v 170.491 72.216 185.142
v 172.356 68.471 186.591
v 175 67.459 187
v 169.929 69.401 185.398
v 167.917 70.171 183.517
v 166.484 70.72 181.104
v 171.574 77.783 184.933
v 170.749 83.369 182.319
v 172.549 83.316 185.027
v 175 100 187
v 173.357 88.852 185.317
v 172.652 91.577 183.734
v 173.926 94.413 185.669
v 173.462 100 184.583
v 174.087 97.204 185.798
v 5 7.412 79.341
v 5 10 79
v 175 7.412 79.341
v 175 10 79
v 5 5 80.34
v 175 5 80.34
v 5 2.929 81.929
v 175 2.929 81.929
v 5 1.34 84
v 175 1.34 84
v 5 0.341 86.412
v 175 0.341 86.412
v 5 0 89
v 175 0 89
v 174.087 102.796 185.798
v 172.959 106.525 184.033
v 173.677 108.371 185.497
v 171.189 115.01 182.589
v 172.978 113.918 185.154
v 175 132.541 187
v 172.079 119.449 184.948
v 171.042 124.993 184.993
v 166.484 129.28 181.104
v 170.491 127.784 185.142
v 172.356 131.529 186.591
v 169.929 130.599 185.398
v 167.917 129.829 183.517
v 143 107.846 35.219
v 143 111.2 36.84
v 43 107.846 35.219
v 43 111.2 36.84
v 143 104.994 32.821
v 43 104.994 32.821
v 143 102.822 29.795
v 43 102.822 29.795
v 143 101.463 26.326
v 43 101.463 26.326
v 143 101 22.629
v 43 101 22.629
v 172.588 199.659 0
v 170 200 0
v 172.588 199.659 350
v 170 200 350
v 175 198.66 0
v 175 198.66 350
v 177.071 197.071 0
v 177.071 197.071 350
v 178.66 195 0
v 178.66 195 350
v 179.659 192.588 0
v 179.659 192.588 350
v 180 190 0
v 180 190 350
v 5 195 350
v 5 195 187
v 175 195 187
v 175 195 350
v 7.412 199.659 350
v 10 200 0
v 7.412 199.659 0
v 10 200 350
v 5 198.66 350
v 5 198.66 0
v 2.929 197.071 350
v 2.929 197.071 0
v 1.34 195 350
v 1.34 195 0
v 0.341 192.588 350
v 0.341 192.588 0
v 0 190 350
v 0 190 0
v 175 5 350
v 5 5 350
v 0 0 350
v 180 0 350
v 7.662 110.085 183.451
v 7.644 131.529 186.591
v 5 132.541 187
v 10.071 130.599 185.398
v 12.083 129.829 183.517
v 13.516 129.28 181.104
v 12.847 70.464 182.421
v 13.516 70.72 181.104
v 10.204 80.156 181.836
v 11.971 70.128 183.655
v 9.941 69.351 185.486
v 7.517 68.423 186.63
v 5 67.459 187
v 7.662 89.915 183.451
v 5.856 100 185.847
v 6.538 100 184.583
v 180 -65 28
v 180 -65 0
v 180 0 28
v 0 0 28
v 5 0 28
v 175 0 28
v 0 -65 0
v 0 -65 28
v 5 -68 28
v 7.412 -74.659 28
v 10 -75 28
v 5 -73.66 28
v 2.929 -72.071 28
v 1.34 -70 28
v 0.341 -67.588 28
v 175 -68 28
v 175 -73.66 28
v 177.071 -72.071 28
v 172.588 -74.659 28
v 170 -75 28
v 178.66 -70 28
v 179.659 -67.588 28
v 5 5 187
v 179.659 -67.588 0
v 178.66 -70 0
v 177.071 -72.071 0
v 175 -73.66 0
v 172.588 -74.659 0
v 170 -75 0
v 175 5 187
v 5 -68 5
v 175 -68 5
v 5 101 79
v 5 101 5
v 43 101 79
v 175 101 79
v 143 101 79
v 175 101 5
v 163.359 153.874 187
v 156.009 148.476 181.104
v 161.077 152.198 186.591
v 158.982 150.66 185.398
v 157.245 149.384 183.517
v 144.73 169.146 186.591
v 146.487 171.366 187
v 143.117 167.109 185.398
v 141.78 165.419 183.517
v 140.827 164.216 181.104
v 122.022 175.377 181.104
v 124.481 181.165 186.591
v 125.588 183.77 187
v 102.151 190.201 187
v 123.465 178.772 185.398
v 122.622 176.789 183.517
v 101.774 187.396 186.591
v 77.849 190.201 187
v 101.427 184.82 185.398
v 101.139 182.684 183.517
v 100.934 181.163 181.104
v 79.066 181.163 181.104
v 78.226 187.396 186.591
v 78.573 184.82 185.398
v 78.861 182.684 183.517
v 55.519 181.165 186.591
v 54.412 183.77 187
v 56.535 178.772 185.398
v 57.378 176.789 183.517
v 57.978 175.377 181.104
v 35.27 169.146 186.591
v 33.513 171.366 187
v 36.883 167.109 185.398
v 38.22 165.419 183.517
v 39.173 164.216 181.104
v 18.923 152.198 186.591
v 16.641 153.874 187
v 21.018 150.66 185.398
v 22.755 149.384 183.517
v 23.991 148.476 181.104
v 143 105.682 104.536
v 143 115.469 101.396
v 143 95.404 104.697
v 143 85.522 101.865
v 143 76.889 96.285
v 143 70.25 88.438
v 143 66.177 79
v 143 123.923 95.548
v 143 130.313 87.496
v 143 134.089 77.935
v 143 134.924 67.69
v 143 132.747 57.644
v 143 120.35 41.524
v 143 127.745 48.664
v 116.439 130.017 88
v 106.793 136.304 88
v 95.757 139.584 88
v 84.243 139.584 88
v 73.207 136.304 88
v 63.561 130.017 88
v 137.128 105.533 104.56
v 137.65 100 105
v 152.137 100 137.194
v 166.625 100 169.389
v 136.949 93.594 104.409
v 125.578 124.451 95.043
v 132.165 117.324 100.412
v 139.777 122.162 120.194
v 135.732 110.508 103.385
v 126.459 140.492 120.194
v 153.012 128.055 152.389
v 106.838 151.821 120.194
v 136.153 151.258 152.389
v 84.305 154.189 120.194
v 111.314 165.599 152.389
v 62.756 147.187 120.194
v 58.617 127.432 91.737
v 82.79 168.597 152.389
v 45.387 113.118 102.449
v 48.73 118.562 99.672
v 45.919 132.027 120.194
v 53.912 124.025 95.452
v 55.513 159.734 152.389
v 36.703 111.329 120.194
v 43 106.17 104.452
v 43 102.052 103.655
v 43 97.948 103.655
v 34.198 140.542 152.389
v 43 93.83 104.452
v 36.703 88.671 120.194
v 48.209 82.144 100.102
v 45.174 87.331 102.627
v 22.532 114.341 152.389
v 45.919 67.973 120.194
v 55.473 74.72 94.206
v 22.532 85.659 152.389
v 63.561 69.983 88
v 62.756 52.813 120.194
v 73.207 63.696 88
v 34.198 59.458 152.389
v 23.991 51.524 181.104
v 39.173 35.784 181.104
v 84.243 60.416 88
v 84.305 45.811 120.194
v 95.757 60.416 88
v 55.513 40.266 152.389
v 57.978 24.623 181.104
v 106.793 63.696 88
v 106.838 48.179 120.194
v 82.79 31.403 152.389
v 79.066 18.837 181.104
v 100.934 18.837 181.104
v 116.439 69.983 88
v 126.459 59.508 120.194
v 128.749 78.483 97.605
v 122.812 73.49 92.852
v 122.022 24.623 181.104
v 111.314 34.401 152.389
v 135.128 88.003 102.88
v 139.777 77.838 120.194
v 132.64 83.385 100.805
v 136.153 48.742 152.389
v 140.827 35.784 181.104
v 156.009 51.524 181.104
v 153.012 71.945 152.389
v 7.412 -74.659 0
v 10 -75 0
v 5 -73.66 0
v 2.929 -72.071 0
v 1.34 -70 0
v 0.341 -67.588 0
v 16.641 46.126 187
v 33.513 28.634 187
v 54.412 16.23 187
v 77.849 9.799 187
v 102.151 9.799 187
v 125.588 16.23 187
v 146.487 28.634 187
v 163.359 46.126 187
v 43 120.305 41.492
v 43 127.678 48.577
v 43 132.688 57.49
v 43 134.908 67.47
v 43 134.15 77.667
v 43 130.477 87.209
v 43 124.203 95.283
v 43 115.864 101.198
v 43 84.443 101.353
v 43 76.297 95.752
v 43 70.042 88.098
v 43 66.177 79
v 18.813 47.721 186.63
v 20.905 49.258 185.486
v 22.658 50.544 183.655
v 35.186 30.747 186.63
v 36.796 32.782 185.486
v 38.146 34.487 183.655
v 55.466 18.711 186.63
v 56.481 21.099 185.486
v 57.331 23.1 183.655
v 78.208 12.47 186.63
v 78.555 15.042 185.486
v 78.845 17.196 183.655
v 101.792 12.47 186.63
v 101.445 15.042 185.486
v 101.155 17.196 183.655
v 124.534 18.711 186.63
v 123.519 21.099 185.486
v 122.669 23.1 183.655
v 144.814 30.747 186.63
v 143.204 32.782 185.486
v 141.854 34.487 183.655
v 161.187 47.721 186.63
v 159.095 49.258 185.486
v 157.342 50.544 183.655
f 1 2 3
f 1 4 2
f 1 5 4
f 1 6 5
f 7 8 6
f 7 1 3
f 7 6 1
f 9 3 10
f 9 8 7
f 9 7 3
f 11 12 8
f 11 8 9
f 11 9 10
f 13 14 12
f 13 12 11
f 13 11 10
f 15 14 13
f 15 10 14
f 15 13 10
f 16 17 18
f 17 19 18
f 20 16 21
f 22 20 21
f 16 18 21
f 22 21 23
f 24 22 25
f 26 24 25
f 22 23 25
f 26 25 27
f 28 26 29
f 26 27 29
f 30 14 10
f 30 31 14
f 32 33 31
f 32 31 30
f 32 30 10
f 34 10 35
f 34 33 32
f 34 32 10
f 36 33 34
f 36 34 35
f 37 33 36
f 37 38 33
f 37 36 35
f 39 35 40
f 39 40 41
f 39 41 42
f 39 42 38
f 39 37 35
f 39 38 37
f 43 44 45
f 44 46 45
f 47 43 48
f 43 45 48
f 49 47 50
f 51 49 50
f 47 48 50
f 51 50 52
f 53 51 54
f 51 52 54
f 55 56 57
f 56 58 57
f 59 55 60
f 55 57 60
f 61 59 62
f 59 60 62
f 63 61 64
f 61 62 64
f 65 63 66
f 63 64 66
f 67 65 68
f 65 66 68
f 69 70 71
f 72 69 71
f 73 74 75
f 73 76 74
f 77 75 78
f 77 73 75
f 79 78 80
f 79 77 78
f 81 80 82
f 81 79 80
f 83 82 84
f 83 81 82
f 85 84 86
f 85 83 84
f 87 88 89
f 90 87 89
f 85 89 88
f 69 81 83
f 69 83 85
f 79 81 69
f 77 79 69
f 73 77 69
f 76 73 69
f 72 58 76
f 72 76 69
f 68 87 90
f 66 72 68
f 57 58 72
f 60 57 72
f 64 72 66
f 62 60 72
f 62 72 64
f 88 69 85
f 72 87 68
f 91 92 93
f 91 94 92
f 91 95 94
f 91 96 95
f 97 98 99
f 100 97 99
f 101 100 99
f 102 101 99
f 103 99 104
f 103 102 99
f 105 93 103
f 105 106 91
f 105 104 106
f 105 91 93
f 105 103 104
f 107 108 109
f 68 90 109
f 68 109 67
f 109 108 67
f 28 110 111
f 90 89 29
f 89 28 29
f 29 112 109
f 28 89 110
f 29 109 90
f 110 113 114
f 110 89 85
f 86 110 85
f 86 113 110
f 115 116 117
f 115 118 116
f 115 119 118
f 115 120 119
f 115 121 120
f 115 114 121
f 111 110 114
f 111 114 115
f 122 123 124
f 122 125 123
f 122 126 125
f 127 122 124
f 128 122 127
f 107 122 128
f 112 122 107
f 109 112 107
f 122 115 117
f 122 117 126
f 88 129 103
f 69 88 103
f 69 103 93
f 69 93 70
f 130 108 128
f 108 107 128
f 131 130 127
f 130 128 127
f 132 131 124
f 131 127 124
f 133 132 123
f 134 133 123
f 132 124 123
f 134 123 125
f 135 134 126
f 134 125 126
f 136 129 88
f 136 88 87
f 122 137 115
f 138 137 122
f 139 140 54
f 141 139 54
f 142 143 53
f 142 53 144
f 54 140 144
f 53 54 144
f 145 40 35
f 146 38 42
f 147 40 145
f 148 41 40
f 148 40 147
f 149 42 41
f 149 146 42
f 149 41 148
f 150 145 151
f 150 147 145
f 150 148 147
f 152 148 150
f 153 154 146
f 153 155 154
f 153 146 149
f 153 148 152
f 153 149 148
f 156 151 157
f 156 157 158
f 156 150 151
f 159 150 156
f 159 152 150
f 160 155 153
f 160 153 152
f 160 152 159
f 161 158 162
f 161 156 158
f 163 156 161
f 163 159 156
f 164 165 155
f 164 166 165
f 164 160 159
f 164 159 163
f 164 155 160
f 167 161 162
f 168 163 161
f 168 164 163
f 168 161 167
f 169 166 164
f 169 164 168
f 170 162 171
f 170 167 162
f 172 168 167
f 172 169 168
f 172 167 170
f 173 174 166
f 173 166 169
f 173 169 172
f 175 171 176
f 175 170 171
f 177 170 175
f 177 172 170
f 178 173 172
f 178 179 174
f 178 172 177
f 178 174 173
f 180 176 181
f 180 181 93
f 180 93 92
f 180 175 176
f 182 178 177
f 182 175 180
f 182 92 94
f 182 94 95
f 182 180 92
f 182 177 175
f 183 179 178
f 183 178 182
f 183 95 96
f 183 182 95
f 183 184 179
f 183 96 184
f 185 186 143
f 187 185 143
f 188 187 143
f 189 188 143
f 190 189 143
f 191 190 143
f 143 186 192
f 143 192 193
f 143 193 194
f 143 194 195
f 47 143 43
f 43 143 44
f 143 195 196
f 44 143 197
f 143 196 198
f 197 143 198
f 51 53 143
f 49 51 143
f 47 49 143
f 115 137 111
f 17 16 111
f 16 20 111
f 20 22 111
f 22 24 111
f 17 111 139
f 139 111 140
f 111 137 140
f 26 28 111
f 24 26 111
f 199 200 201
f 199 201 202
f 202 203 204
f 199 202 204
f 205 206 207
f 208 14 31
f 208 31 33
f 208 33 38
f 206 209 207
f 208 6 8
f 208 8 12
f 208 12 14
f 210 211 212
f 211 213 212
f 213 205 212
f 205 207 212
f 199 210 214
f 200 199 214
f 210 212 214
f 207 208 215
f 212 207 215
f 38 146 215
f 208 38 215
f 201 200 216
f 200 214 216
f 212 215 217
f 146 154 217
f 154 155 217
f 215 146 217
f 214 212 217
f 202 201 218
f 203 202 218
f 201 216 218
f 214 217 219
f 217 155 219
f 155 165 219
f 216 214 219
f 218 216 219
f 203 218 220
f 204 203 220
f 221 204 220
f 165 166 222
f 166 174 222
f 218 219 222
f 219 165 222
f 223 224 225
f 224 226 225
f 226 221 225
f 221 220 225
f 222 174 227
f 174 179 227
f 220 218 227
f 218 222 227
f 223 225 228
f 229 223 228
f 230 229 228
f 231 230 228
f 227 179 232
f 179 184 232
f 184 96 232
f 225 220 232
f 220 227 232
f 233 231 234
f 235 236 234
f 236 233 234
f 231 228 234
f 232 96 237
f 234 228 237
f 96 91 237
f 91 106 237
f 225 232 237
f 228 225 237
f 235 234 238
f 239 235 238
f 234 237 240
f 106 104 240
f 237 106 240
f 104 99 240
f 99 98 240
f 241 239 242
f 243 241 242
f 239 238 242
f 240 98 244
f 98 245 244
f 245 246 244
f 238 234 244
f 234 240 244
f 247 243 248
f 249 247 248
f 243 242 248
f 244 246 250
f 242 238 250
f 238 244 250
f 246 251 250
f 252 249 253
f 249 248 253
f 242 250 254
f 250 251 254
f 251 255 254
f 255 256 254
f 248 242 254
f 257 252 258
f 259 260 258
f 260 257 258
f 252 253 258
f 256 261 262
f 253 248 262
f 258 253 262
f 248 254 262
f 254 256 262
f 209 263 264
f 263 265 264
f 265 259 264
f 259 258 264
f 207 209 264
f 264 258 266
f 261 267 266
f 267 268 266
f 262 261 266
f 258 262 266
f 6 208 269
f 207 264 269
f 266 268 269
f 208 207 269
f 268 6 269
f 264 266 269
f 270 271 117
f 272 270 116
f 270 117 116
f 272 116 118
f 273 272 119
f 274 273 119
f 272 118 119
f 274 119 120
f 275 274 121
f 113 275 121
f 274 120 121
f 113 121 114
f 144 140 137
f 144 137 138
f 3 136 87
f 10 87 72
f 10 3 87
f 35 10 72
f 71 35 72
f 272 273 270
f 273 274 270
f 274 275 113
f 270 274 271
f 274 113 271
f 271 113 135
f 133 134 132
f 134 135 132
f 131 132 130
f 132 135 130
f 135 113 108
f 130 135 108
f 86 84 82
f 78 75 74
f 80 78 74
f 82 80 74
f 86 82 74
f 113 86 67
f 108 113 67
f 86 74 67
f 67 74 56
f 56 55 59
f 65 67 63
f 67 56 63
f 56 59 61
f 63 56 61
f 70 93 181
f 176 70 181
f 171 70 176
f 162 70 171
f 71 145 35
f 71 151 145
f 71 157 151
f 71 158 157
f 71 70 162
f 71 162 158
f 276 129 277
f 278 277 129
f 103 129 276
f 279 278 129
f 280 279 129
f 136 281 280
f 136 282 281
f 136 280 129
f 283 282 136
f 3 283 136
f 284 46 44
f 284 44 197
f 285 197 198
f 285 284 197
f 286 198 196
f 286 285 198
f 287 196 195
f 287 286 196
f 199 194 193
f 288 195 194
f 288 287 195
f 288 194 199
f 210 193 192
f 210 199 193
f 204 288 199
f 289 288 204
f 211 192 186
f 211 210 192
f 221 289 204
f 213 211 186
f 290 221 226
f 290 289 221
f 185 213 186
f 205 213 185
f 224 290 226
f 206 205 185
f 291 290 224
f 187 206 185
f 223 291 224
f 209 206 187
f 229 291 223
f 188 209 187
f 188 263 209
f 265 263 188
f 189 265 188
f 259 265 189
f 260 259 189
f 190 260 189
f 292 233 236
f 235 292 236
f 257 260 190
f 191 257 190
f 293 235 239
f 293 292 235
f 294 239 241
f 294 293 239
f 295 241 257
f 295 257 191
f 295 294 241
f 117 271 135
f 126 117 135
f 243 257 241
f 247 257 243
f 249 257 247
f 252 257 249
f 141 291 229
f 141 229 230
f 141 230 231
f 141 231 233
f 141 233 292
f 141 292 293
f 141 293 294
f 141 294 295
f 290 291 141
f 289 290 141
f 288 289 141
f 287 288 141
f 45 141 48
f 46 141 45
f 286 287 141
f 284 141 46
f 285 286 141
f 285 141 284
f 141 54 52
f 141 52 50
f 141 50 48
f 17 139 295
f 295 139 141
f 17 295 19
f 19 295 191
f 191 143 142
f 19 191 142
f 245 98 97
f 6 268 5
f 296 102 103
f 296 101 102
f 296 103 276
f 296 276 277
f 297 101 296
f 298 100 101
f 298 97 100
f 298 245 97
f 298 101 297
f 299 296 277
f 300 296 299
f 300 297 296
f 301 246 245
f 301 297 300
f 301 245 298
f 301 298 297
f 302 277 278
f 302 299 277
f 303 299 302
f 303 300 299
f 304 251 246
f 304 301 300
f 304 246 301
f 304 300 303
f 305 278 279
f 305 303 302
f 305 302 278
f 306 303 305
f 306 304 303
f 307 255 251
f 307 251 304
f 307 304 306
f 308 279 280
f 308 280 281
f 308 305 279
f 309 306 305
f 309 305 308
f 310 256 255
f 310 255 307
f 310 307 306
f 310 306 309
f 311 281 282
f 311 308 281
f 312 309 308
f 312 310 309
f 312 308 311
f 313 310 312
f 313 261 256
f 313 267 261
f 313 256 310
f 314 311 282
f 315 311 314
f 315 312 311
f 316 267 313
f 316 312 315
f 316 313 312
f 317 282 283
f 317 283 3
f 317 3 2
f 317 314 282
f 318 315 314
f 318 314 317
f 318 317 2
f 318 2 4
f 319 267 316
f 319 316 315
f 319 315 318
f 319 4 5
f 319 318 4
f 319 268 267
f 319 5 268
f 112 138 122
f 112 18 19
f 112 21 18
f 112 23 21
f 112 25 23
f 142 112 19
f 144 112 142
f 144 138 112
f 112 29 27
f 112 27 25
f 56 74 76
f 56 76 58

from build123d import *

# Parameters (mm, degrees)
CYLINDER_R           = 35
CYLINDER_DEPTH       = 100
CYLINDER_PITCH_ANGLE = 90
BOX003_W             = 170
BOX003_H             = 169
BOX003_DEPTH         = 74
BOX001_W             = 170
BOX001_H             = 190
BOX001_DEPTH         = 166
BOX_W                = 180
BOX_H                = 200
BOX_DEPTH            = 350
BOX002_W             = 180
BOX002_H             = 80
BOX002_DEPTH         = 28
FILLET_R             = 10
FILLET001_R          = 10
FILLET002_R          = 10
FILLET003_R          = 10
FILLET004_R          = 10
FILLET005_R          = 15
FILLET006_R          = 10


with BuildPart() as cylinder:
    # Cylinder → Cylinder (new body)
    with BuildSketch(Plane.XY):
        Circle(CYLINDER_R)
    extrude(amount=CYLINDER_DEPTH)


with BuildPart() as cylinder_1:
    # Cylinder pitch: moved
    add(cylinder.part.rotate(Axis((0, 0, 0), (0, 1, 0)), CYLINDER_PITCH_ANGLE))


with BuildPart() as cylinder_2:
    # Cylinder placement: moved
    add(cylinder_1.part.moved(Location((43, 100, 70))))


with BuildPart() as cube003:
    # Box003 → Box003 (new body)
    with BuildSketch(Plane(origin=(5, -68, 5), x_dir=(1, 0, 0), z_dir=(0, 0, 1))):
        with Locations((85, 84.5)):
            Rectangle(BOX003_W, BOX003_H)
    extrude(amount=BOX003_DEPTH)


with BuildPart() as cube001:
    # Box001 → Box001 (new body)
    with BuildSketch(Plane(origin=(5, 5, 187), x_dir=(1, 0, 0), z_dir=(0, 0, 1))):
        with Locations((85, 95)):
            Rectangle(BOX001_W, BOX001_H)
    extrude(amount=BOX001_DEPTH)


with BuildPart() as cone:
    # Cone → Cone (revolve)
    with BuildSketch(Plane(origin=(90, 100, 88), x_dir=(1, 0, 0), z_dir=(0, -1, 0))):
        Polygon((0, 0), (40, 0), (85, 100), (0, 100), align=None)
    revolve(axis=Axis((90, 100, 88), (0, 0, 1)))


with BuildPart() as cut001:
    # Box → Box (new body)
    with BuildSketch(Plane.XY):
        with Locations((90, 100)):
            Rectangle(BOX_W, BOX_H)
    extrude(amount=BOX_DEPTH)

    # Cut: cut Cone
    add(cone.part, mode=Mode.SUBTRACT)

    # Cut001: cut Cube001
    add(cube001.part, mode=Mode.SUBTRACT)


with BuildPart() as fillet006:
    # Box002 → Box002 (new body)
    with BuildSketch(Plane(origin=(0, -75, 0), x_dir=(1, 0, 0), z_dir=(0, 0, 1))):
        with Locations((90, 40)):
            Rectangle(BOX002_W, BOX002_H)
    extrude(amount=BOX002_DEPTH)

    # Fusion: union Cut001
    add(cut001.part)

    # Cut002: cut Cube003
    add(cube003.part, mode=Mode.SUBTRACT)

    # Cut003: cut Cylinder
    add(cylinder_2.part, mode=Mode.SUBTRACT)

    # Fillet
    fillet_edges = [fillet006.edges().sort_by_distance(p)[0] for p in [
        (180, 200, 175),
    ]]
    fillet(fillet_edges, radius=FILLET_R)

    # Fillet001
    fillet001_edges = [fillet006.edges().sort_by_distance(p)[0] for p in [
        (0, 200, 175),
    ]]
    fillet(fillet001_edges, radius=FILLET001_R)

    # Fillet002
    fillet002_edges = [fillet006.edges().sort_by_distance(p)[0] for p in [
        (180, -75, 14),
    ]]
    fillet(fillet002_edges, radius=FILLET002_R)

    # Fillet003
    fillet003_edges = [fillet006.edges().sort_by_distance(p)[0] for p in [
        (0, -75, 14),
    ]]
    fillet(fillet003_edges, radius=FILLET003_R)

    # Fillet004
    fillet004_edges = [fillet006.edges().sort_by_distance(p)[0] for p in [
        (5.45, 100, 187),
    ]]
    fillet(fillet004_edges, radius=FILLET004_R)

    # Fillet005
    fillet005_edges = [fillet006.edges().sort_by_distance(p)[0] for p in [
        (93, 101, 35.014289),
    ]]
    fillet(fillet005_edges, radius=FILLET005_R)

    # Fillet006
    fillet006_edges = [fillet006.edges().sort_by_distance(p)[0] for p in [
        (90, 0, 79),
    ]]
    fillet(fillet006_edges, radius=FILLET006_R)


solid = fillet006.part
